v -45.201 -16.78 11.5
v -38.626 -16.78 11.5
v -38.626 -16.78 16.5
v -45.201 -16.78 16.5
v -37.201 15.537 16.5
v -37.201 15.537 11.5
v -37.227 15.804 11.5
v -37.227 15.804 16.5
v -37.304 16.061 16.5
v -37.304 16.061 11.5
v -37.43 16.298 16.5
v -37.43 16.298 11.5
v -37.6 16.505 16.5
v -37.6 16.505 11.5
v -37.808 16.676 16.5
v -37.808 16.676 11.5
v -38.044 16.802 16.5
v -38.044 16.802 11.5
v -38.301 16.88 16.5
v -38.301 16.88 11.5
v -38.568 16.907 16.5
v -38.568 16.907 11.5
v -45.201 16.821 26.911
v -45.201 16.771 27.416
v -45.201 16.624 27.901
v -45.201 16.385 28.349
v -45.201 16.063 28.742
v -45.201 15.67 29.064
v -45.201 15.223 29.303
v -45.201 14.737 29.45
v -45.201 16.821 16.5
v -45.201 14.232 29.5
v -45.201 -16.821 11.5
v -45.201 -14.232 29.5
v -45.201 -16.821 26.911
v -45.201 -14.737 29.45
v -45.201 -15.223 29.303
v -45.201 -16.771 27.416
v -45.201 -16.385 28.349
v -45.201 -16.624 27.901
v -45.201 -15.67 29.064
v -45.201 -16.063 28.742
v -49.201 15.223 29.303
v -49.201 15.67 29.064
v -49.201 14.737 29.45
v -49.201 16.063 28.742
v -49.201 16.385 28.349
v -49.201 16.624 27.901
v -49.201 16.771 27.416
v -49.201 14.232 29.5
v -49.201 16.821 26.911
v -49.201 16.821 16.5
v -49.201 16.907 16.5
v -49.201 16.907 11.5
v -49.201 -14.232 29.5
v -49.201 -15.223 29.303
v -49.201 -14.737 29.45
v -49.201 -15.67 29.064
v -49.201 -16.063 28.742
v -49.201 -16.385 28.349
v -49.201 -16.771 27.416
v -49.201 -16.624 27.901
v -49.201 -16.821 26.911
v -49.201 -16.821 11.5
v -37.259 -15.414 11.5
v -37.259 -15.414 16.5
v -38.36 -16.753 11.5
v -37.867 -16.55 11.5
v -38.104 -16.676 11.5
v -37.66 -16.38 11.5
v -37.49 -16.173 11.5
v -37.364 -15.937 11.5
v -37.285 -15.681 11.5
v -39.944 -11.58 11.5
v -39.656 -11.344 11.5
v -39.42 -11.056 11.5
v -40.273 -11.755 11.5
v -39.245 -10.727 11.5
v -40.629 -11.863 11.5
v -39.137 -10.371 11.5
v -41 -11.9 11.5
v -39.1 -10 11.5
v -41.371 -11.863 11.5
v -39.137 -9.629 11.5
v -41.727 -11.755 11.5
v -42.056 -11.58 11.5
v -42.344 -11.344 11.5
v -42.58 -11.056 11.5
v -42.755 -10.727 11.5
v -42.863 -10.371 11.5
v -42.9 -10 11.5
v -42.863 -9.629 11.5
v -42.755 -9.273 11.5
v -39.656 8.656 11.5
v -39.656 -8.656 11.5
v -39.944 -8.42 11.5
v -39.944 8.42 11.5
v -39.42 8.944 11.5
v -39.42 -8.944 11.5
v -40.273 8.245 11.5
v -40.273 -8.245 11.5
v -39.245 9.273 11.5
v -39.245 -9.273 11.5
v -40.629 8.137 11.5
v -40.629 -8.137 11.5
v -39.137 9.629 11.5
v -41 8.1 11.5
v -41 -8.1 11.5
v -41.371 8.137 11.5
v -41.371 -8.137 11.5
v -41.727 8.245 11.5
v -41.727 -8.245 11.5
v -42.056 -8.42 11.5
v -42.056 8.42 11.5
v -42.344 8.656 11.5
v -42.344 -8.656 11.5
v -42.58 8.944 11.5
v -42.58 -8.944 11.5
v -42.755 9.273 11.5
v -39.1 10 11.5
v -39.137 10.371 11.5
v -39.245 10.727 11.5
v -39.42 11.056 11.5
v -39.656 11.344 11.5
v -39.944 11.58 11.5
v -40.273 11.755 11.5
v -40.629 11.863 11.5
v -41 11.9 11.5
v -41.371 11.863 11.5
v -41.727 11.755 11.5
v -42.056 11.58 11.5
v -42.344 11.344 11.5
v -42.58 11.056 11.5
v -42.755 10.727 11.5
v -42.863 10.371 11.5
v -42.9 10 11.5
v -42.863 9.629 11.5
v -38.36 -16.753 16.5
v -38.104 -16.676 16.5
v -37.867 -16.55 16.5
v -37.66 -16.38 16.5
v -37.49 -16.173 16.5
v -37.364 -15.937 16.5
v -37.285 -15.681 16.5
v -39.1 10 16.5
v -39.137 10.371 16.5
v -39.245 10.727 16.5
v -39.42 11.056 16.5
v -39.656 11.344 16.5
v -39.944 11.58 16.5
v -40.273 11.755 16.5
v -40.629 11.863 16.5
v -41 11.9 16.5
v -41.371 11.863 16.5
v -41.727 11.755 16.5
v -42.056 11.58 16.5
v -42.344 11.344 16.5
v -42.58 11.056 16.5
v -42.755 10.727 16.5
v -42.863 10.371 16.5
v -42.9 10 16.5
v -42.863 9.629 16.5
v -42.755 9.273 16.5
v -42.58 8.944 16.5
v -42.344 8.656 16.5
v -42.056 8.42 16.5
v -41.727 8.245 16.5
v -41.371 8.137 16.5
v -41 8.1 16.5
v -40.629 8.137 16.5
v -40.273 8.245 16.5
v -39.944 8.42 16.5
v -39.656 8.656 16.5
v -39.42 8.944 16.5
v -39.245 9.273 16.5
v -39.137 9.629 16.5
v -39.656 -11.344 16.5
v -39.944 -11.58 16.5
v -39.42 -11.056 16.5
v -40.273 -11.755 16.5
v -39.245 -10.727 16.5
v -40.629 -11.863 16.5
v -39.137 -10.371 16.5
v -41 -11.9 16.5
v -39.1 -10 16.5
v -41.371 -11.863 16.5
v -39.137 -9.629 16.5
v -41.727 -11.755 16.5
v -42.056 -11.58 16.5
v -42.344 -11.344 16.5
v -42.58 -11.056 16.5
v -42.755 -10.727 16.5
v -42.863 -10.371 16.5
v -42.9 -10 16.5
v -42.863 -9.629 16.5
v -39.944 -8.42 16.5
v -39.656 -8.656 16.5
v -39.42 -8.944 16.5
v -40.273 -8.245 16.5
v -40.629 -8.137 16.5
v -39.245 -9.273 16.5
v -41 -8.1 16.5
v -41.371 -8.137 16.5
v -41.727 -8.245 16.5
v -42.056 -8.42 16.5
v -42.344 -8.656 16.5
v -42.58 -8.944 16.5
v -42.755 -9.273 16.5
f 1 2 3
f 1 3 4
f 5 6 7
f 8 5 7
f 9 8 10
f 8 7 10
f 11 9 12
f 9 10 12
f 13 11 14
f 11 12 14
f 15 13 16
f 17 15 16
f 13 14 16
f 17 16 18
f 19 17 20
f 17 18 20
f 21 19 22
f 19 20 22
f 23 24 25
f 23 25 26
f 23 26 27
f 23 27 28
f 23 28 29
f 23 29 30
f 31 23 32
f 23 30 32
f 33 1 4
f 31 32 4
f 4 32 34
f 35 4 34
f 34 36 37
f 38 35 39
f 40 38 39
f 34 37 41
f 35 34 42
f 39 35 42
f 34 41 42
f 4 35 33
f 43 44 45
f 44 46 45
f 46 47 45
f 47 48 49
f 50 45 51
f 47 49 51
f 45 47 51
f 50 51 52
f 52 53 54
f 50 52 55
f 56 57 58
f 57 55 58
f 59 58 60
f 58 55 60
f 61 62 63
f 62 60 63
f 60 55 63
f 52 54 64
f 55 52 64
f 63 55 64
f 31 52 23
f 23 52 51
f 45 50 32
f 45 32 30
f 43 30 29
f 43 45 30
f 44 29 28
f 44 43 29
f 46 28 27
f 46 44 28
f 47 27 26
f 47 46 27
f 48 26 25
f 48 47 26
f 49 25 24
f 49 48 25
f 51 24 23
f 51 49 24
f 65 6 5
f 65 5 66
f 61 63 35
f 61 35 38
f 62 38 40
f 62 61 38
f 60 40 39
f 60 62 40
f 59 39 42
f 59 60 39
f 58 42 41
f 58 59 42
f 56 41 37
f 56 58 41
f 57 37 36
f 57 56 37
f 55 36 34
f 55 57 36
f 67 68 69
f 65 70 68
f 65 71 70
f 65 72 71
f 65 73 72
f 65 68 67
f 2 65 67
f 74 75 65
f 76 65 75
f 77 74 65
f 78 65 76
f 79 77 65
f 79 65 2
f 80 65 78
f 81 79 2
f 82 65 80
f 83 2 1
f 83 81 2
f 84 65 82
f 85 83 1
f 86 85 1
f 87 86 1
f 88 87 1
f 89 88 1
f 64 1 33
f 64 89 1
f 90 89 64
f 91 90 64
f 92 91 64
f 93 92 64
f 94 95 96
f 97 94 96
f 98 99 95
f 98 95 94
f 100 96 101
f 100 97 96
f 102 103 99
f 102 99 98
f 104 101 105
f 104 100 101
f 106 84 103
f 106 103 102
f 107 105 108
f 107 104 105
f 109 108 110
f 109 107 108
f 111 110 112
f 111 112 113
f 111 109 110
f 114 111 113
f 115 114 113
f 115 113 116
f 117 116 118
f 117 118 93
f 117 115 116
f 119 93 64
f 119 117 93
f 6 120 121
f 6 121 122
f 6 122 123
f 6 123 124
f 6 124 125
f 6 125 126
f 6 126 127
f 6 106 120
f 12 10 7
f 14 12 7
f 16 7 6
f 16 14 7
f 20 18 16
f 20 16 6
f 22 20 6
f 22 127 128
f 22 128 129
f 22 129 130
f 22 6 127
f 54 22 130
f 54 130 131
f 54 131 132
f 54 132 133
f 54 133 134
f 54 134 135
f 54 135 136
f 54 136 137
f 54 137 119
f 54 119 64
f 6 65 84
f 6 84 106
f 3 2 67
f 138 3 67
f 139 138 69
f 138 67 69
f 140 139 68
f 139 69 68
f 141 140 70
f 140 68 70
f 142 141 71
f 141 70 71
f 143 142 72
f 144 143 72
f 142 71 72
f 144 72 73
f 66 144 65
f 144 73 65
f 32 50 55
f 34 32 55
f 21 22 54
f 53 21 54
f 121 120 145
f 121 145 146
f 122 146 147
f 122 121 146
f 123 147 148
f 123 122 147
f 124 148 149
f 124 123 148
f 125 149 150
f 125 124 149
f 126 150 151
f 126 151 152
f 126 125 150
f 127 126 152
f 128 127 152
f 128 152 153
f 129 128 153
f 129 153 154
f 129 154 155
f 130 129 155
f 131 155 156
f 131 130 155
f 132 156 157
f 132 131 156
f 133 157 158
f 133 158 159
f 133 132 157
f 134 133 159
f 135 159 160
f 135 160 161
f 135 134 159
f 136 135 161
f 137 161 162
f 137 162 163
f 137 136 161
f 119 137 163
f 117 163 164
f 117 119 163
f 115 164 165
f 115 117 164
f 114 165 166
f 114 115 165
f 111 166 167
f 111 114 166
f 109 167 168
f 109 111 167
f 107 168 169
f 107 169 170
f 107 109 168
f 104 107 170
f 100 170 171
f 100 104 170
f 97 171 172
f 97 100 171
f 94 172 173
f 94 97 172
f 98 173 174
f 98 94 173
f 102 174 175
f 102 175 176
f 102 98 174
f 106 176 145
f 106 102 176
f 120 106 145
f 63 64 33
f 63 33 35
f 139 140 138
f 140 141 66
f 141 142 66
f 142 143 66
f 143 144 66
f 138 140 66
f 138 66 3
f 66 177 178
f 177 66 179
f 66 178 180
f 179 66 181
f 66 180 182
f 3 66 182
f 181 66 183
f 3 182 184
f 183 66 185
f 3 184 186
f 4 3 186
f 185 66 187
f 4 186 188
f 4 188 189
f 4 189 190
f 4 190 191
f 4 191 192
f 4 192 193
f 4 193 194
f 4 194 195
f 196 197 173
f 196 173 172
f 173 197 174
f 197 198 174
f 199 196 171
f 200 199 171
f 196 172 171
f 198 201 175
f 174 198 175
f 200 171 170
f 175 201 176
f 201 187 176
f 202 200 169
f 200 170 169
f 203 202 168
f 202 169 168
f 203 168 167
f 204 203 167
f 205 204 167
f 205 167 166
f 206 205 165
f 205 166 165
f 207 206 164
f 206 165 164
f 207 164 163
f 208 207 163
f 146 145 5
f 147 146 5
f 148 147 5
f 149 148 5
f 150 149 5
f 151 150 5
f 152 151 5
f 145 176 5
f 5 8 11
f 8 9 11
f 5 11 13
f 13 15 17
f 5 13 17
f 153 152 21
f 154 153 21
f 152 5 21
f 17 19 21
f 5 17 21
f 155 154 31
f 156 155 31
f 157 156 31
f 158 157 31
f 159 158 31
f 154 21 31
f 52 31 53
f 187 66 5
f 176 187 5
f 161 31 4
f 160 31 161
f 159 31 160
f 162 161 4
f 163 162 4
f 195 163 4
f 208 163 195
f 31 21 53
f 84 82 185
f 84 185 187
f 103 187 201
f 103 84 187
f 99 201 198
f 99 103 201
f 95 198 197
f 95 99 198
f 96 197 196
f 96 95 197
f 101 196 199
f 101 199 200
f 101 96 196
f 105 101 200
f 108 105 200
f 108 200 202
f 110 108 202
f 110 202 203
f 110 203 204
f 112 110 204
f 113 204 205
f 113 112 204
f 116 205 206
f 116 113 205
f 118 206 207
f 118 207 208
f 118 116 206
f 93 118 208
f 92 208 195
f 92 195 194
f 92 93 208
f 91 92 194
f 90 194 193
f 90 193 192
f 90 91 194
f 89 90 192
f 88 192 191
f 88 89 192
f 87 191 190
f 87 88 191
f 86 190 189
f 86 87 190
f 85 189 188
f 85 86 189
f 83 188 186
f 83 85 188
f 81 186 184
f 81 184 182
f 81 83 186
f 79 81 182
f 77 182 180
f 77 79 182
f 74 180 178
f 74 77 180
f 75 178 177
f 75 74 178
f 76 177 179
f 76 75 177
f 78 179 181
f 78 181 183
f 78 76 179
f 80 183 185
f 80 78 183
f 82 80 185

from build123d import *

# Parameters (mm, degrees)
SKETCH013_R      = 1.9
EXTRUDE012_DEPTH = 5
EXTRUDE013_DEPTH = 4


with BuildPart() as extrude012:
    # Sketch013 → Extrude012 (new body)
    with BuildSketch(Plane.XY):
        with BuildLine():
            Line((-37.200665, 15.536565), (-37.258781, -15.414486))
            ThreePointArc((-38.626377, -16.779517), (-37.660247, -16.379864), (-37.258781, -15.414486))
            Line((-38.626377, -16.779517), (-49.200665, -16.779517))
            Line((-49.200665, 16.906731), (-49.200665, -16.779517))
            Line((-38.56826, 16.906731), (-49.200665, 16.906731))
            ThreePointArc((-37.200665, 15.536565), (-37.600315, 16.505263), (-38.56826, 16.906731))
        make_face()
        with Locations((-41, 10)):
            Circle(SKETCH013_R, mode=Mode.SUBTRACT)
        with Locations((-41, -10)):
            Circle(SKETCH013_R, mode=Mode.SUBTRACT)
    extrude(amount=EXTRUDE012_DEPTH)


with BuildPart() as extrude012_1:
    # Extrude012 placement: moved
    add(extrude012.part.moved(Location((0, 0, 11.5))))


with BuildPart() as stop_switch_toucher:
    # Sketch014 (on Face5 of Extrude012) → Extrude013 (new body)
    with BuildSketch(Plane(origin=(-49.200665, 0, 11.5), x_dir=(0, -1, 0), z_dir=(-1, 0, 0))):
        with BuildLine():
            Line((-16.821022, 0), (16.821022, 0))
            Line((16.821022, 0), (16.821022, 15.410553))
            ThreePointArc((16.821022, 15.410553), (16.062591, 17.241569), (14.231576, 18))
            Line((-14.231576, 18), (14.231576, 18))
            ThreePointArc((-14.231576, 18), (-16.062591, 17.241569), (-16.821022, 15.410553))
            Line((-16.821022, 0), (-16.821022, 15.410553))
        make_face()
    extrude(amount=-EXTRUDE013_DEPTH)

    # Fusion013: union Extrude012
    add(extrude012_1.part)


solid = stop_switch_toucher.part
